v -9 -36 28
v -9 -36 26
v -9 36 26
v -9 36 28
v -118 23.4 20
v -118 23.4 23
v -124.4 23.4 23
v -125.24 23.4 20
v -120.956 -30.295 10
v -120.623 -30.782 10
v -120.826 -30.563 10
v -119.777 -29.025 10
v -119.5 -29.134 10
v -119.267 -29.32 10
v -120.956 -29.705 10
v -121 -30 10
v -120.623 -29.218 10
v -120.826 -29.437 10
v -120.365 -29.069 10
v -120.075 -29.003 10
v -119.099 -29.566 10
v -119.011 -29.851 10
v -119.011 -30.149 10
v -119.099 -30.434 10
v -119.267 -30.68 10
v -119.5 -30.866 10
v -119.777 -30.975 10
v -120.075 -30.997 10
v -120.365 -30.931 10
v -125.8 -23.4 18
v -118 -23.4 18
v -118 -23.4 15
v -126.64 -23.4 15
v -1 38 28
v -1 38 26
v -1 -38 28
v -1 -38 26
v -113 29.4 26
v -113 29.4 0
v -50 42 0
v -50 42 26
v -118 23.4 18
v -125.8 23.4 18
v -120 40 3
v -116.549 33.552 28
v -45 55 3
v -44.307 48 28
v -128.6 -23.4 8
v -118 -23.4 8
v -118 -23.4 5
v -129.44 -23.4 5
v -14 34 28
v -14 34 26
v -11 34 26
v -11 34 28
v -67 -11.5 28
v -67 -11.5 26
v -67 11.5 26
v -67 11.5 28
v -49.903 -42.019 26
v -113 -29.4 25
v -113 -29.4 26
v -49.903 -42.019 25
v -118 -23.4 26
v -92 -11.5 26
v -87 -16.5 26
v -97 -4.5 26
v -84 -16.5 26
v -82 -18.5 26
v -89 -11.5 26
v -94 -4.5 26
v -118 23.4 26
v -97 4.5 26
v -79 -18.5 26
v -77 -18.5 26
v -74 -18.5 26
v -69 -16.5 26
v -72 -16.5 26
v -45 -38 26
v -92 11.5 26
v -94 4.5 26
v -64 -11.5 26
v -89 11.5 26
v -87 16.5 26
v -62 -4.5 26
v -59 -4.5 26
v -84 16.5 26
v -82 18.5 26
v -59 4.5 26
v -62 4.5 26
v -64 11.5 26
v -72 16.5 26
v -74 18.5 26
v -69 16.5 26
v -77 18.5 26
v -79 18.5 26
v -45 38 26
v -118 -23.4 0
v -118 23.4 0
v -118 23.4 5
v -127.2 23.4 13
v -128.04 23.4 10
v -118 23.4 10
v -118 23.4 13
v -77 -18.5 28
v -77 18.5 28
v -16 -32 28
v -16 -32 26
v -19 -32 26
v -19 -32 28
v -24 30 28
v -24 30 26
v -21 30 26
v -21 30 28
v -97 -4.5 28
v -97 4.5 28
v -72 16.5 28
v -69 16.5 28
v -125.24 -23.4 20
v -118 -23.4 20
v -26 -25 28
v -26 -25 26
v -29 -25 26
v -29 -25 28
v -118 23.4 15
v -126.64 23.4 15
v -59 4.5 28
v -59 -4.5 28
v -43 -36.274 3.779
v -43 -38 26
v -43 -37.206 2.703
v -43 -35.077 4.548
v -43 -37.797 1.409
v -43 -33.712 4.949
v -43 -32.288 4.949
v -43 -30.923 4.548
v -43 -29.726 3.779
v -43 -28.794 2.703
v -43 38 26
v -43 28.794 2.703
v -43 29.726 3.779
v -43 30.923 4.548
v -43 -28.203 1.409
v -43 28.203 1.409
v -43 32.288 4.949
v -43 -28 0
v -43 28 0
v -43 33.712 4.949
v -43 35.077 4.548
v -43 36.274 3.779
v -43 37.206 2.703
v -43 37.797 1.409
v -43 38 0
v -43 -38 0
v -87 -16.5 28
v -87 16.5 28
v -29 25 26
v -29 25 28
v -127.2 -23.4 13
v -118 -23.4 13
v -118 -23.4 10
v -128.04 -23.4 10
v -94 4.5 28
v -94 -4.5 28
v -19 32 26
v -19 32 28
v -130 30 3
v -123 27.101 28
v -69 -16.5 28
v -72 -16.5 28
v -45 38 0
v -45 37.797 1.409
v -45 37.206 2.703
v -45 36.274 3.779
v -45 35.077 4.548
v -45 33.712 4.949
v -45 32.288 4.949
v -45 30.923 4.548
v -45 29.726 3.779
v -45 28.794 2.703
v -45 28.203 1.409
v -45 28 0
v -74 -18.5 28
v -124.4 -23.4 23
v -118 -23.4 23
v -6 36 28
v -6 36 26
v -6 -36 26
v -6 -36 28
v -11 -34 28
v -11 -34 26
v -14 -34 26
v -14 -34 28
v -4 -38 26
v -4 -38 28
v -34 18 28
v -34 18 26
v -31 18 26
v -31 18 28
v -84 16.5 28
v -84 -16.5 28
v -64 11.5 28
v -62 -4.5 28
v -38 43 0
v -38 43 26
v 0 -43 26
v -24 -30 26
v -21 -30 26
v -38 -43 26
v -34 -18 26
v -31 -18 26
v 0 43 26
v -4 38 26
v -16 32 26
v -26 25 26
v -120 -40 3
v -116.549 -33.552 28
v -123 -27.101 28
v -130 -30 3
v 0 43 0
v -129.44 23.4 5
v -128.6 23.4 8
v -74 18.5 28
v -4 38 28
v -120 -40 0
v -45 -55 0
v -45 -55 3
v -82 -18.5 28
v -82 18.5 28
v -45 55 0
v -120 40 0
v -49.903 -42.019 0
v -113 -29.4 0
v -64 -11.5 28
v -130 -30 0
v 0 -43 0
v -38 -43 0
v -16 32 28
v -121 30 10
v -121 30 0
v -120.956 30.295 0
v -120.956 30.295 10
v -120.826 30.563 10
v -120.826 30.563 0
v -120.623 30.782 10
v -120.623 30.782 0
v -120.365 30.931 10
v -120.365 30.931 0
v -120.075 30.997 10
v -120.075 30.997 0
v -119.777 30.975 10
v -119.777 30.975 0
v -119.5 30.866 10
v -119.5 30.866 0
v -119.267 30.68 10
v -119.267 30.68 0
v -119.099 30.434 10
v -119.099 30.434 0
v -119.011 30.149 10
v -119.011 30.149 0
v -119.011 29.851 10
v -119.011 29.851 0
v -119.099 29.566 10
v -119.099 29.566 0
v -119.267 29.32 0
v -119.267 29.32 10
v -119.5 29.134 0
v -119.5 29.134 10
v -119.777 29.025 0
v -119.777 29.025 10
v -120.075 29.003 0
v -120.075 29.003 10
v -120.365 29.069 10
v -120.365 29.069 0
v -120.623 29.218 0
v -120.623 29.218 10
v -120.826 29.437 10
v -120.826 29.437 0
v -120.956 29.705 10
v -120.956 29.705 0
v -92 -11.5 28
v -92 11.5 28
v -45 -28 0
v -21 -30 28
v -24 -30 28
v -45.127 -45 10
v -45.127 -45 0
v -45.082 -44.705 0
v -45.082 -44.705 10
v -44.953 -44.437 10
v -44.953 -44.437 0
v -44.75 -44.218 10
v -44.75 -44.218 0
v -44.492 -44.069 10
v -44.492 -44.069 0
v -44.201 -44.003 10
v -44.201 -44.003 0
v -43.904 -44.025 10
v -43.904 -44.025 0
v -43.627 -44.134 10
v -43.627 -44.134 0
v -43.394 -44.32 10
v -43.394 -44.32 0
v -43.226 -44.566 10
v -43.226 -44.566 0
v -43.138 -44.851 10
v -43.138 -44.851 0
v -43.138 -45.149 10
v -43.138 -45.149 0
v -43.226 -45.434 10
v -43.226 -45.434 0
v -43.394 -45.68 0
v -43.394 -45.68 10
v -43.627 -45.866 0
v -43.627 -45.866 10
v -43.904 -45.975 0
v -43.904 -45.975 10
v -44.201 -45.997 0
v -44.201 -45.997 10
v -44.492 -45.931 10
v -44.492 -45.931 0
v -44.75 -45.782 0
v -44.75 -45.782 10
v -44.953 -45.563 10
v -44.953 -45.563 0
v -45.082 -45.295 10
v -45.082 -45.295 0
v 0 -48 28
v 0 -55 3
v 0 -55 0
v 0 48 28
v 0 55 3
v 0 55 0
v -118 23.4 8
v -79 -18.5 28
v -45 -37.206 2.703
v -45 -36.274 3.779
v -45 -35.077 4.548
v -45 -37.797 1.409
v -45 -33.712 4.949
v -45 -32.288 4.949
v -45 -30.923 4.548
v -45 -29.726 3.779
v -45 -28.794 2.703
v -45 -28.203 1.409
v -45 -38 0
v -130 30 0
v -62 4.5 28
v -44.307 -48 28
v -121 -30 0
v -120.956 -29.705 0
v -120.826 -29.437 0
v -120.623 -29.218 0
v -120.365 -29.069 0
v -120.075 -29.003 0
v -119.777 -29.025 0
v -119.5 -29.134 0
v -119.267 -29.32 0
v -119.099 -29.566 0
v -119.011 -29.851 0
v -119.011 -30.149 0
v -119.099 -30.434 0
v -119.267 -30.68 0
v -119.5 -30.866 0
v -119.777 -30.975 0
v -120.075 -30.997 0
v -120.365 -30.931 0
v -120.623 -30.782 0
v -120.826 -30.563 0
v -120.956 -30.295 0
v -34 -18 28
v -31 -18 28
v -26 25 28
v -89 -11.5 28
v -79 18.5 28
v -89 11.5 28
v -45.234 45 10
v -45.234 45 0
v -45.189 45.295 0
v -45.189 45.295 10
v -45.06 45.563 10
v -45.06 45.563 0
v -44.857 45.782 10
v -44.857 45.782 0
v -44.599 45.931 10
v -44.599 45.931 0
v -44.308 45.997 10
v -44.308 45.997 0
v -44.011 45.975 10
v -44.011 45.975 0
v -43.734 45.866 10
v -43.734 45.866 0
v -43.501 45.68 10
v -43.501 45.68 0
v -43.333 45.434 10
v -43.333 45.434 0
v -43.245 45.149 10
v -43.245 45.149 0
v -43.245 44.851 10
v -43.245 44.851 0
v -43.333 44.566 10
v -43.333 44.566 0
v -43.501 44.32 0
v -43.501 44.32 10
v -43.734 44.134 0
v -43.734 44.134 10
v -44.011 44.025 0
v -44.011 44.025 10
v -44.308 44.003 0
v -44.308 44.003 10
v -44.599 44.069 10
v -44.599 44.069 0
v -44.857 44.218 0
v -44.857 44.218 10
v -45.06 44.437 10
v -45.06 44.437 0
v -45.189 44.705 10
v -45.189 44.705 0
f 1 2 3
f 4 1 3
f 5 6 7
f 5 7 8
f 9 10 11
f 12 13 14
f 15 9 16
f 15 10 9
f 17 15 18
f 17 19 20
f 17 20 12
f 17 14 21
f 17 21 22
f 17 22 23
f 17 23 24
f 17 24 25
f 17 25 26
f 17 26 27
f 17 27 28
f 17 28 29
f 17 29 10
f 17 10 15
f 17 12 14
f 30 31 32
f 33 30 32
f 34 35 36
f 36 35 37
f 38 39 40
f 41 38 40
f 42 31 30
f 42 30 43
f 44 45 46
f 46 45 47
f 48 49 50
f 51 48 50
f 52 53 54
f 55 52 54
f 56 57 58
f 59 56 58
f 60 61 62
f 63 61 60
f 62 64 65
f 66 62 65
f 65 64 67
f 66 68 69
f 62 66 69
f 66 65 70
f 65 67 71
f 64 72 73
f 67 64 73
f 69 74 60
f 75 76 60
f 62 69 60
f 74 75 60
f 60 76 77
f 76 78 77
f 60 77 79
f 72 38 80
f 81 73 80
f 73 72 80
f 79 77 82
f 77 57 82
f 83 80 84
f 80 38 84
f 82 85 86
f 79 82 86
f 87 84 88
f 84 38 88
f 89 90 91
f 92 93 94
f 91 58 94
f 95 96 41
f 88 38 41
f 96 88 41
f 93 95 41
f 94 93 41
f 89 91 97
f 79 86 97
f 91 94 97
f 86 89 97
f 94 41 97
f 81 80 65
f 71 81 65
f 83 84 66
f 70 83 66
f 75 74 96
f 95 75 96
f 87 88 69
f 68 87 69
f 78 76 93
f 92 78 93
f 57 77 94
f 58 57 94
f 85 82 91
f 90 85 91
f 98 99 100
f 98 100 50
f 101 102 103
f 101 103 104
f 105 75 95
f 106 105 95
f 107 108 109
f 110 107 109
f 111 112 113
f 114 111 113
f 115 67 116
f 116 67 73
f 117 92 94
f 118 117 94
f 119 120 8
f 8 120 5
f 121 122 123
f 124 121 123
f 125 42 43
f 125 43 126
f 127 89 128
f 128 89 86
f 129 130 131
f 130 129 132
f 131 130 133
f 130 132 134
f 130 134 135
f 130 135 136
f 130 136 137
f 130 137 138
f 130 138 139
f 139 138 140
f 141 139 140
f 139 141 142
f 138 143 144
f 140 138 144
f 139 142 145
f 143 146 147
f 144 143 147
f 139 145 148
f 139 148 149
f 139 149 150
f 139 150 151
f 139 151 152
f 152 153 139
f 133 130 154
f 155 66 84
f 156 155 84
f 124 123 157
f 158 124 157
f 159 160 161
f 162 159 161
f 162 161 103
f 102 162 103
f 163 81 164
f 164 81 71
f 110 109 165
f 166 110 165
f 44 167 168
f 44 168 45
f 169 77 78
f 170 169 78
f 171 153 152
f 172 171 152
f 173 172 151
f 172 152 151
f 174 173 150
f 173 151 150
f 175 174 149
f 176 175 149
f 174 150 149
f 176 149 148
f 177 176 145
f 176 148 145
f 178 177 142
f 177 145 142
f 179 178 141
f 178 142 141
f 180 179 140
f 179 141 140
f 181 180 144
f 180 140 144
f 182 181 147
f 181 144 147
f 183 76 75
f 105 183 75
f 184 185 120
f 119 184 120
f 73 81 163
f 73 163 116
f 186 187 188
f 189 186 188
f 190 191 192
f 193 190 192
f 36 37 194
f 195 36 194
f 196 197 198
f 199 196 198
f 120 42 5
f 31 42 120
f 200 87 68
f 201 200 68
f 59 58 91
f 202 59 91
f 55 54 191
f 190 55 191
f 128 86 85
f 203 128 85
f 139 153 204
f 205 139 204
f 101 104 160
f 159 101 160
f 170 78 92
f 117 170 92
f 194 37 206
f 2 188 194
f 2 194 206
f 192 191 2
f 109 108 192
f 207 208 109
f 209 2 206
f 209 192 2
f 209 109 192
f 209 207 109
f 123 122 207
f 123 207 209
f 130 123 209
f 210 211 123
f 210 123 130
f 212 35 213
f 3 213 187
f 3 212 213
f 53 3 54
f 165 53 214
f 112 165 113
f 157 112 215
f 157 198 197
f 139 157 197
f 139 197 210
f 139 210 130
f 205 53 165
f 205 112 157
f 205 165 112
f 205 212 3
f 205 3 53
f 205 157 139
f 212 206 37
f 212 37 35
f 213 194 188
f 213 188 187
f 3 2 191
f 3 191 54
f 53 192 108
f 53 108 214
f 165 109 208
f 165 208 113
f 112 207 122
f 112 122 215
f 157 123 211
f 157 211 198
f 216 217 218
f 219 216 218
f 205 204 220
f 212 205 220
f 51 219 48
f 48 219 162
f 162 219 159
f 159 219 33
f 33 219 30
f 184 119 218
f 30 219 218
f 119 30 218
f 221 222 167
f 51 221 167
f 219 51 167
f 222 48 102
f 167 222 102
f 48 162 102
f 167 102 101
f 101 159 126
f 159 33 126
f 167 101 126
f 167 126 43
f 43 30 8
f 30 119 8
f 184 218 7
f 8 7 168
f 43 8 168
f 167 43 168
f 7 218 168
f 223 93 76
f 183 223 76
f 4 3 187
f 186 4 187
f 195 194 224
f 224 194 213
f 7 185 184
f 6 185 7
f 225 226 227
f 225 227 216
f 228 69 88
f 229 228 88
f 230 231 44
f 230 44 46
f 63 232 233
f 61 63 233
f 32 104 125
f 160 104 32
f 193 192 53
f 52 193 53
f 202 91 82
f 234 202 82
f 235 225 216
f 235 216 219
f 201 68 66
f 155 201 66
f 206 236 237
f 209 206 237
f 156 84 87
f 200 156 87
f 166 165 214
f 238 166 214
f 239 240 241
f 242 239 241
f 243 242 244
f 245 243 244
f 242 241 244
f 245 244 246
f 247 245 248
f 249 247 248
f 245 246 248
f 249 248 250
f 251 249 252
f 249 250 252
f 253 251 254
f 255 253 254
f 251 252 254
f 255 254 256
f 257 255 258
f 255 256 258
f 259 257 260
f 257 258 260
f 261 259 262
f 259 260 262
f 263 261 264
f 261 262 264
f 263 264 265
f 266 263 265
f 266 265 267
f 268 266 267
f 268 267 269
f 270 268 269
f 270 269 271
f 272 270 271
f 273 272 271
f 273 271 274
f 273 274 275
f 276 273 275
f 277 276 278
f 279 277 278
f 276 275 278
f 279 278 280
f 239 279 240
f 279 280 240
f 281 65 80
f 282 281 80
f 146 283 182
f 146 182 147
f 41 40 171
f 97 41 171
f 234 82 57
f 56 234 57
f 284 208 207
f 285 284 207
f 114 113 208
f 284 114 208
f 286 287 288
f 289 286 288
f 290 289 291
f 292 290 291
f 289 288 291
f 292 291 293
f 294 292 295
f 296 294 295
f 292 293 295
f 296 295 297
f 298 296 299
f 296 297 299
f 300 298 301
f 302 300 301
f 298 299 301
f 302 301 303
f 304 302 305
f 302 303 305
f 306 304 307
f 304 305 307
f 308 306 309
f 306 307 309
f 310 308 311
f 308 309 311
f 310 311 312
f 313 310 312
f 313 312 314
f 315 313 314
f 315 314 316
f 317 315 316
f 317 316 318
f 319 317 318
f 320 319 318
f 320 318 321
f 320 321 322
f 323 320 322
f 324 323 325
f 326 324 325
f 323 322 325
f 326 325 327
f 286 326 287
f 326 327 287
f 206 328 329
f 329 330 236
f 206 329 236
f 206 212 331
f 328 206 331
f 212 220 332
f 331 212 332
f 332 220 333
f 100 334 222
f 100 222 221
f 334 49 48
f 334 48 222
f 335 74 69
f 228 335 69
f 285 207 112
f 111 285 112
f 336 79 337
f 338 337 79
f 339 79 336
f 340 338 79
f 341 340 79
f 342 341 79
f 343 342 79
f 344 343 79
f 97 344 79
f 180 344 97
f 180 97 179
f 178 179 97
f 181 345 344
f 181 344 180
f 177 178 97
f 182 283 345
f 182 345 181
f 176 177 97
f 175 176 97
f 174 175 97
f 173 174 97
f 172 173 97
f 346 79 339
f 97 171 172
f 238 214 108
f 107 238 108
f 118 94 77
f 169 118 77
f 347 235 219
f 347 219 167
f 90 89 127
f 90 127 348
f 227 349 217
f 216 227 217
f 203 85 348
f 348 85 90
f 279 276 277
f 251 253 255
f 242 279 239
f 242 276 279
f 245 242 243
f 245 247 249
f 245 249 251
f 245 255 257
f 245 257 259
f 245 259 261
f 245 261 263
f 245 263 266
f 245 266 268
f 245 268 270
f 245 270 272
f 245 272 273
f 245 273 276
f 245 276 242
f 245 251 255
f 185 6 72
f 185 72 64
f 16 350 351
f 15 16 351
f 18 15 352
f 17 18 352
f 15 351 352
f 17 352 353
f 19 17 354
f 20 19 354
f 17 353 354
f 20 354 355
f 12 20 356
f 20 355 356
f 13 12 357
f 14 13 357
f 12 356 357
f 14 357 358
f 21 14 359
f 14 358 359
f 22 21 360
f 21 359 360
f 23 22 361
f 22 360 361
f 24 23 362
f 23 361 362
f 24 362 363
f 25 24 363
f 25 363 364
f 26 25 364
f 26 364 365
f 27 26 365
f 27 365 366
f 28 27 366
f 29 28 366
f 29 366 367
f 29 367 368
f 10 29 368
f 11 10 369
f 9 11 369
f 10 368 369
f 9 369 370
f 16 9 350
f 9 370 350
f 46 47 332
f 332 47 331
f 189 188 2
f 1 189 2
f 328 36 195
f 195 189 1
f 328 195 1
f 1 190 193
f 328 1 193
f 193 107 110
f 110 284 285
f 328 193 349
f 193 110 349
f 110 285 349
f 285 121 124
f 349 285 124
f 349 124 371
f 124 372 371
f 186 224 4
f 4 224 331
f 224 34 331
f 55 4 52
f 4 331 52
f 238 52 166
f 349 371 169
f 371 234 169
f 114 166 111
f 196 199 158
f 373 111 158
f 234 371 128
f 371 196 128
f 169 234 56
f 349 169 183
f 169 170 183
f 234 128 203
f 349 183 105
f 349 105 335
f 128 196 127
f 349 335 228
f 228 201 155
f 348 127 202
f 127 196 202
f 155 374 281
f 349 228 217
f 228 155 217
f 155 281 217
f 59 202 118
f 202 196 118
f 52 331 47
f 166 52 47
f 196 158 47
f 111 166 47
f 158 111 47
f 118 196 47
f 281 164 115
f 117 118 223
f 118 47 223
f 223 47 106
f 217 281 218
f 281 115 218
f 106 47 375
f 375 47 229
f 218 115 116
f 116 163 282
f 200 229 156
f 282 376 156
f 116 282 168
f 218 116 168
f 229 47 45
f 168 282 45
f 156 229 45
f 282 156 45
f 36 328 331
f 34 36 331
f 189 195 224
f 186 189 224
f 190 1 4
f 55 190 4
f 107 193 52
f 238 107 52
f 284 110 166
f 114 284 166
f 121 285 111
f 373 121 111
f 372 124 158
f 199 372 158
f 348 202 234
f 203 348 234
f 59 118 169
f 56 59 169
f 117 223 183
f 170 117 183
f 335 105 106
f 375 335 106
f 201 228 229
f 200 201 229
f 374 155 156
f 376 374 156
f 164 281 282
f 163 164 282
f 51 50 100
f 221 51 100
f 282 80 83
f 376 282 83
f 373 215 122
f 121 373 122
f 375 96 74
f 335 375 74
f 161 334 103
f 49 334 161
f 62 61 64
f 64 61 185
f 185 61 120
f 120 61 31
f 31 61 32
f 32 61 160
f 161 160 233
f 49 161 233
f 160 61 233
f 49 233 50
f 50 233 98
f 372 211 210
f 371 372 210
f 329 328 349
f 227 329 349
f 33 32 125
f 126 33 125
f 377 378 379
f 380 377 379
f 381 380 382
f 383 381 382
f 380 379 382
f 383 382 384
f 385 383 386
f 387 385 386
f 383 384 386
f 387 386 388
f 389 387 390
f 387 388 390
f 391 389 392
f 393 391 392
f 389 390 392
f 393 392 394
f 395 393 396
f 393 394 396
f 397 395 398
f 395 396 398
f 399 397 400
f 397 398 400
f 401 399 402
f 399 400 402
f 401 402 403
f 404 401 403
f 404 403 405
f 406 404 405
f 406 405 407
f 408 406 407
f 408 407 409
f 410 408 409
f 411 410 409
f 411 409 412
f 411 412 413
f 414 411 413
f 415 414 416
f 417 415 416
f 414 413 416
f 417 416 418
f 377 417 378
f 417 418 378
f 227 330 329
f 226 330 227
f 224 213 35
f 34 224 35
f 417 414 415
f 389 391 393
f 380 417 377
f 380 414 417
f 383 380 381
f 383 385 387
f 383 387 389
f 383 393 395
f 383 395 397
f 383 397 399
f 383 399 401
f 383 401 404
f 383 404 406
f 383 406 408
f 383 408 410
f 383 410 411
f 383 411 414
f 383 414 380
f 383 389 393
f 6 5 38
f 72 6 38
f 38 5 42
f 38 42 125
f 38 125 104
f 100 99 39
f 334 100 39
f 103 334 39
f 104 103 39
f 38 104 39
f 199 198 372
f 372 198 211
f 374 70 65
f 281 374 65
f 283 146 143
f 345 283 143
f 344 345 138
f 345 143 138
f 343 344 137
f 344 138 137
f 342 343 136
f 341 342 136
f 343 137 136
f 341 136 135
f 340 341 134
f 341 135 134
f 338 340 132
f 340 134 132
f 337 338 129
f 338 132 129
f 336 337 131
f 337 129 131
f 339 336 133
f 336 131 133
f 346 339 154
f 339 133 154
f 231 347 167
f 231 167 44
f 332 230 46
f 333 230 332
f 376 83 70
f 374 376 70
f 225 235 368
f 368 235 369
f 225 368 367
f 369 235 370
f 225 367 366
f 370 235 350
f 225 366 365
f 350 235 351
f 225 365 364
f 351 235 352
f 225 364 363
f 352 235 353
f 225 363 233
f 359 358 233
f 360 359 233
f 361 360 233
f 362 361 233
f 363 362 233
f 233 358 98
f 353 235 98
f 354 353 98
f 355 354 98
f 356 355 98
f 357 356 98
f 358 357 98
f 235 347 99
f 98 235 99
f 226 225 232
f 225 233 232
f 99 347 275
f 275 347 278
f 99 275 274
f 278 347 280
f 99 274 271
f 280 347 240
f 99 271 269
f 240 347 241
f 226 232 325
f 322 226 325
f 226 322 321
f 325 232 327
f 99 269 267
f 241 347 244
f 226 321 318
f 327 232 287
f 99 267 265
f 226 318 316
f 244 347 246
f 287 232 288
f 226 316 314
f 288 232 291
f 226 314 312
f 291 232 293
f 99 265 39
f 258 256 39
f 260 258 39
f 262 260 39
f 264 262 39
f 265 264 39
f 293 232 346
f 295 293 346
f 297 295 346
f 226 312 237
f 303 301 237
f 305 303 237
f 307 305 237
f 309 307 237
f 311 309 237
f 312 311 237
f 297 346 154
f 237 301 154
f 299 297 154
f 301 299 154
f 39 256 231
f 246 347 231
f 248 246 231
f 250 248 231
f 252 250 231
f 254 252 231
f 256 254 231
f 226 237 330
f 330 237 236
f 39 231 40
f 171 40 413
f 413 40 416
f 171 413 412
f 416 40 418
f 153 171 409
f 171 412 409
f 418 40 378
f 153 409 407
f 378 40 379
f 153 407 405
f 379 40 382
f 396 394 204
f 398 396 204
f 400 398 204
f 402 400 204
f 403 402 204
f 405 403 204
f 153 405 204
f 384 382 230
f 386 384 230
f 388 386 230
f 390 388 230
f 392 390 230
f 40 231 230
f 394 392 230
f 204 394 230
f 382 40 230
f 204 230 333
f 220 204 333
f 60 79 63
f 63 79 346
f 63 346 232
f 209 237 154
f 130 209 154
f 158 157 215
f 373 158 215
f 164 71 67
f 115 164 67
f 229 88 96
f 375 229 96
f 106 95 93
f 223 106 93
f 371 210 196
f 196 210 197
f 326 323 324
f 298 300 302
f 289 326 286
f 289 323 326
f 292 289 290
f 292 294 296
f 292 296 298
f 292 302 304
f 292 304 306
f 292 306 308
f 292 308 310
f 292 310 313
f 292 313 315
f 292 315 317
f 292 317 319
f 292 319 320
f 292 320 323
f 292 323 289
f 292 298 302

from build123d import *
from OCP.BRepFilletAPI import BRepFilletAPI_MakeChamfer

# Parameters (mm, degrees)
ESBO_O1_W                 = 2
ESBO_O1_H                 = 86
RESSALTO_EXTRUS_O3_DEPTH  = 25
RESSALTO_EXTRUS_O16_DEPTH = 25
RESSALTO_EXTRUS_O17_DEPTH = 28
CHANFRO6_SIZE             = 25
CHANFRO6_SIZE2            = 7
RESSALTO_EXTRUS_O19_DEPTH = 25
ESBO_O9_R                 = 1
CORTE_EXTRUS_O1_DEPTH     = 10
ESBO_O13_W                = 5
ESBO_O13_H                = 10
ESBO_O13_W_2              = 3
ESBO_O13_H_2              = 46.8
CORTE_EXTRUS_O6_DEPTH     = 256.564081983
CORTE_EXTRUS_O8_REACH     = 185.679
CORTE_EXTRUS_O9_REACH     = 185.679
CORTE_EXTRUS_O10_REACH    = 257.564
ESBO_O14_W                = 3
ESBO_O14_H                = 46.8
RESSALTO_EXTRUS_O20_DEPTH = 3
CORTE_EXTRUS_O13_DEPTH    = 3
ESBO_O23_W                = 3
ESBO_O23_H                = 4.5
CORTE_EXTRUS_O14_DEPTH    = 3
CORTE_EXTRUS_O15_REACH    = 145.906
ESBO_O24_W                = 130
ESBO_O24_H                = 110
CORTE_EXTRUS_O16_DEPTH    = 1
CORTE_EXTRUS_O17_DEPTH    = 1


with BuildPart() as part:
    # Esboço1 → Ressalto-extrusão3 (new body)
    with BuildSketch(Plane.XY):
        Polygon((-45, -43), (-120, -28), (-120, -30), (-45, -45), (45, -45), (45, -43), (43, -43), (-43, -43), align=None)
        with Locations((44, 0)):
            Rectangle(ESBO_O1_W, ESBO_O1_H)
        Polygon((45, 45), (-45, 45), (-45, 43), (-43, 43), (43, 43), (45, 43), align=None)
        with Locations((-44, 0)):
            Rectangle(ESBO_O1_W, ESBO_O1_H)
        Polygon((-120, 30), (-120, 28), (-45, 43), (-45, 45), align=None)
        Polygon((-45, -43), (-120, -28), (-120, -30), (-45, -45), (45, -45), (45, -43), (43, -43), (-43, -43), align=None)
        Polygon((120, -28), (45, -43), (45, -45), (120, -30), align=None)
        Polygon((120, 30), (45, 45), (45, 43), (120, 28), align=None)
    extrude(amount=RESSALTO_EXTRUS_O3_DEPTH)

    # Esboço6 → Ressalto-extrusão16 (add)
    with BuildSketch(Plane.XY):
        Polygon((-120, -28), (-120, 28), (-118, 28.4), (-118, -28.4), align=None)
        Polygon((120, 28), (120, -28), (118, -28.4), (118, 28.4), align=None)
    extrude(amount=RESSALTO_EXTRUS_O16_DEPTH)

    # Esboço7 → Ressalto-extrusão17 (add)
    with BuildSketch(Plane.XY):
        Polygon((-120, 40), (-45, 55), (45, 55), (120, 40), (130, 30), (130, -30), (120, -40), (45, -55), (-45, -55), (-120, -40), (-130, -30), (-130, 30), align=None)
        Polygon((-45, -45), (45, -45), (120, -30), (120, 30), (45, 45), (-45, 45), (-120, 30), (-120, -30), align=None, mode=Mode.SUBTRACT)
    extrude(amount=RESSALTO_EXTRUS_O17_DEPTH)

    # Chanfro6: one chamfer whose edges measure the first distance from different faces: ONE call of the kernel's chamfer builder (chamfer() names one face for all edges)
    chanfro6_edges_1 = [part.edges().sort_by_distance(p)[0] for p in [
        (82.5, -47.5, 28),
    ]]
    chanfro6_side_1 = [part.faces().sort_by_distance(p)[0] for p in [
        (82.5, -47.5, 14),
    ]]
    chanfro6_edges_2 = [part.edges().sort_by_distance(p)[0] for p in [
        (125, -35, 28),
    ]]
    chanfro6_side_2 = [part.faces().sort_by_distance(p)[0] for p in [
        (125, -35, 14),
    ]]
    chanfro6_edges_3 = [part.edges().sort_by_distance(p)[0] for p in [
        (130, 0, 28),
    ]]
    chanfro6_side_3 = [part.faces().sort_by_distance(p)[0] for p in [
        (130, 0, 14),
    ]]
    chanfro6_edges_4 = [part.edges().sort_by_distance(p)[0] for p in [
        (125, 35, 28),
    ]]
    chanfro6_side_4 = [part.faces().sort_by_distance(p)[0] for p in [
        (125, 35, 14),
    ]]
    chanfro6_edges_5 = [part.edges().sort_by_distance(p)[0] for p in [
        (82.5, 47.5, 28),
    ]]
    chanfro6_side_5 = [part.faces().sort_by_distance(p)[0] for p in [
        (82.5, 47.5, 14),
    ]]
    chanfro6_edges_6 = [part.edges().sort_by_distance(p)[0] for p in [
        (0, 55, 28),
    ]]
    chanfro6_side_6 = [part.faces().sort_by_distance(p)[0] for p in [
        (0, 55, 14),
    ]]
    chanfro6_edges_7 = [part.edges().sort_by_distance(p)[0] for p in [
        (-82.5, 47.5, 28),
    ]]
    chanfro6_side_7 = [part.faces().sort_by_distance(p)[0] for p in [
        (-82.5, 47.5, 14),
    ]]
    chanfro6_edges_8 = [part.edges().sort_by_distance(p)[0] for p in [
        (-125, 35, 28),
    ]]
    chanfro6_side_8 = [part.faces().sort_by_distance(p)[0] for p in [
        (-125, 35, 14),
    ]]
    chanfro6_edges_9 = [part.edges().sort_by_distance(p)[0] for p in [
        (-130, 0, 28),
    ]]
    chanfro6_side_9 = [part.faces().sort_by_distance(p)[0] for p in [
        (-130, 0, 14),
    ]]
    chanfro6_edges_10 = [part.edges().sort_by_distance(p)[0] for p in [
        (-125, -35, 28),
    ]]
    chanfro6_side_10 = [part.faces().sort_by_distance(p)[0] for p in [
        (-125, -35, 14),
    ]]
    chanfro6_edges_11 = [part.edges().sort_by_distance(p)[0] for p in [
        (-82.5, -47.5, 28),
    ]]
    chanfro6_side_11 = [part.faces().sort_by_distance(p)[0] for p in [
        (-82.5, -47.5, 14),
    ]]
    chanfro6_edges_12 = [part.edges().sort_by_distance(p)[0] for p in [
        (0, -55, 28),
    ]]
    chanfro6_side_12 = [part.faces().sort_by_distance(p)[0] for p in [
        (0, -55, 14),
    ]]
    chanfro6 = BRepFilletAPI_MakeChamfer(part.part.solid().wrapped)
    for e in chanfro6_edges_1:
        chanfro6.Add(CHANFRO6_SIZE, CHANFRO6_SIZE2, e.wrapped, chanfro6_side_1[0].wrapped)  # the first distance lies on this face
    for e in chanfro6_edges_2:
        chanfro6.Add(CHANFRO6_SIZE, CHANFRO6_SIZE2, e.wrapped, chanfro6_side_2[0].wrapped)  # the first distance lies on this face
    for e in chanfro6_edges_3:
        chanfro6.Add(CHANFRO6_SIZE, CHANFRO6_SIZE2, e.wrapped, chanfro6_side_3[0].wrapped)  # the first distance lies on this face
    for e in chanfro6_edges_4:
        chanfro6.Add(CHANFRO6_SIZE, CHANFRO6_SIZE2, e.wrapped, chanfro6_side_4[0].wrapped)  # the first distance lies on this face
    for e in chanfro6_edges_5:
        chanfro6.Add(CHANFRO6_SIZE, CHANFRO6_SIZE2, e.wrapped, chanfro6_side_5[0].wrapped)  # the first distance lies on this face
    for e in chanfro6_edges_6:
        chanfro6.Add(CHANFRO6_SIZE, CHANFRO6_SIZE2, e.wrapped, chanfro6_side_6[0].wrapped)  # the first distance lies on this face
    for e in chanfro6_edges_7:
        chanfro6.Add(CHANFRO6_SIZE, CHANFRO6_SIZE2, e.wrapped, chanfro6_side_7[0].wrapped)  # the first distance lies on this face
    for e in chanfro6_edges_8:
        chanfro6.Add(CHANFRO6_SIZE, CHANFRO6_SIZE2, e.wrapped, chanfro6_side_8[0].wrapped)  # the first distance lies on this face
    for e in chanfro6_edges_9:
        chanfro6.Add(CHANFRO6_SIZE, CHANFRO6_SIZE2, e.wrapped, chanfro6_side_9[0].wrapped)  # the first distance lies on this face
    for e in chanfro6_edges_10:
        chanfro6.Add(CHANFRO6_SIZE, CHANFRO6_SIZE2, e.wrapped, chanfro6_side_10[0].wrapped)  # the first distance lies on this face
    for e in chanfro6_edges_11:
        chanfro6.Add(CHANFRO6_SIZE, CHANFRO6_SIZE2, e.wrapped, chanfro6_side_11[0].wrapped)  # the first distance lies on this face
    for e in chanfro6_edges_12:
        chanfro6.Add(CHANFRO6_SIZE, CHANFRO6_SIZE2, e.wrapped, chanfro6_side_12[0].wrapped)  # the first distance lies on this face
    add(Compound.cast(chanfro6.Shape()), mode=Mode.REPLACE)

    # Esboço8 → Ressalto-extrusão19 (add)
    with BuildSketch(Plane.XY):
        Polygon((-118, 28.4), (-118, 23.4), (-113, 29.4), align=None)
        Polygon((-45, 38), (-45, 43), (-50, 42), align=None)
        Polygon((-49.902903378, -42.019419324), (-45, -43), (-45, -38), align=None)
        Polygon((-118, -23.4), (-118, -28.4), (-113, -29.4), align=None)
        Polygon((118, 23.4), (118, 28.4), (113, 29.4), align=None)
        Polygon((113, -29.4), (118, -28.4), (118, -23.4), align=None)
        Polygon((45, -38), (45, -43), (50, -42), align=None)
        Polygon((50, 42), (45, 43), (45, 38), align=None)
        Polygon((-43, -38), (-43, -43), (-38, -43), align=None)
        Polygon((-38, 43), (-43, 43), (-43, 38), align=None)
        Polygon((43, 38), (43, 43), (38, 43), align=None)
        Polygon((38, -43), (43, -43), (43, -38), align=None)
    extrude(amount=RESSALTO_EXTRUS_O19_DEPTH)

    # Esboço9 → Corte-extrusão1 (cut)
    with BuildSketch(Plane(origin=(0, 0, 0), x_dir=(-1, 0, 0), z_dir=(0, 0, -1))):
        with Locations((44.126560345, -45)):
            Circle(ESBO_O9_R)
        with Locations((-44.233718703, -45)):
            Circle(ESBO_O9_R)
        with Locations((-44.233718703, 45)):
            Circle(ESBO_O9_R)
        with Locations((44.233718703, 45)):
            Circle(ESBO_O9_R)
        with Locations((120, -30)):
            Circle(ESBO_O9_R)
        with Locations((120, 30)):
            Circle(ESBO_O9_R)
        with Locations((-120, 30)):
            Circle(ESBO_O9_R)
        with Locations((-120, -30)):
            Circle(ESBO_O9_R)
    extrude(amount=-CORTE_EXTRUS_O1_DEPTH, mode=Mode.SUBTRACT)

    # Esboço13 → Corte-extrusão6 (cut, through all)
    with BuildSketch(Plane.ZY.offset(-118)):
        with Locations((2.5, 0)):
            Rectangle(ESBO_O13_W, ESBO_O13_H)
        with Locations((21.5, 0)):
            Rectangle(ESBO_O13_W_2, ESBO_O13_H_2)
        with Locations((16.5, 0)):
            Rectangle(ESBO_O13_W_2, ESBO_O13_H_2)
        with Locations((11.5, 0)):
            Rectangle(ESBO_O13_W_2, ESBO_O13_H_2)
    extrude(amount=-CORTE_EXTRUS_O6_DEPTH, mode=Mode.SUBTRACT)

    # Esboço15 → Corte-extrusão8 (cut, up to next)
    with BuildSketch(Plane.ZY.offset(-43), mode=Mode.PRIVATE) as corte_extrus_o8_sk1:
        with BuildLine():
            ThreePointArc((0, -38), (2.5, -35.5), (0, -33))
            Line((0, -33), (0, -38))
        make_face()
    corte_extrus_o8_tool1 = extrude(corte_extrus_o8_sk1.sketch, amount=-CORTE_EXTRUS_O8_REACH, mode=Mode.PRIVATE) & part.part
    # Esboço15 → Corte-extrusão8 (cut, up to next)
    with BuildSketch(Plane.ZY.offset(-43), mode=Mode.PRIVATE) as corte_extrus_o8_sk2:
        with BuildLine():
            ThreePointArc((0, 33), (2.5, 35.5), (0, 38))
            Line((0, 38), (0, 33))
        make_face()
    corte_extrus_o8_tool2 = extrude(corte_extrus_o8_sk2.sketch, amount=-CORTE_EXTRUS_O8_REACH, mode=Mode.PRIVATE) & part.part
    add(corte_extrus_o8_tool1.solids().sort_by_distance((43, -35.5, 1.061033))[0], mode=Mode.SUBTRACT)
    add(corte_extrus_o8_tool2.solids().sort_by_distance((43, 35.5, 1.061033))[0], mode=Mode.SUBTRACT)

    # Esboço16 → Corte-extrusão9 (cut, up to next)
    with BuildSketch(Plane(origin=(-43, 0, 0), x_dir=(0, 0, -1), z_dir=(1, 0, 0)), mode=Mode.PRIVATE) as corte_extrus_o9_sk1:
        with BuildLine():
            ThreePointArc((0, -28), (-5, -33), (0, -38))
            Line((0, -38), (0, -28))
        make_face()
    corte_extrus_o9_tool1 = extrude(corte_extrus_o9_sk1.sketch, amount=-CORTE_EXTRUS_O9_REACH, mode=Mode.PRIVATE) & part.part
    # Esboço16 → Corte-extrusão9 (cut, up to next)
    with BuildSketch(Plane(origin=(-43, 0, 0), x_dir=(0, 0, -1), z_dir=(1, 0, 0)), mode=Mode.PRIVATE) as corte_extrus_o9_sk2:
        with BuildLine():
            ThreePointArc((0, 38), (-5, 33), (0, 28))
            Line((0, 28), (0, 38))
        make_face()
    corte_extrus_o9_tool2 = extrude(corte_extrus_o9_sk2.sketch, amount=-CORTE_EXTRUS_O9_REACH, mode=Mode.PRIVATE) & part.part
    add(corte_extrus_o9_tool1.solids().sort_by_distance((-43, -33, 2.122066))[0], mode=Mode.SUBTRACT)
    add(corte_extrus_o9_tool2.solids().sort_by_distance((-43, 33, 2.122066))[0], mode=Mode.SUBTRACT)

    # Corte-extrusão10: up to this plane
    corte_extrus_o10_end = Plane(origin=(-123, -38, 28), z_dir=(-0.9629640197141827, 0, 0.2696299255199678))
    # Esboço14 → Corte-extrusão10 (cut, up to the surface)
    with BuildSketch(Plane(origin=(-118, 0, 0), x_dir=(0, 0, -1), z_dir=(1, 0, 0)), mode=Mode.PRIVATE) as corte_extrus_o10_sk1:
        with Locations((-21.5, 0)):
            Rectangle(ESBO_O14_W, ESBO_O14_H)
    corte_extrus_o10_tool1 = split(extrude(corte_extrus_o10_sk1.sketch, amount=-CORTE_EXTRUS_O10_REACH, mode=Mode.PRIVATE), bisect_by=corte_extrus_o10_end, keep=Keep.BOTH, mode=Mode.PRIVATE)
    add(corte_extrus_o10_tool1.solids().sort_by_distance((-118, 0, 21.5))[0], mode=Mode.SUBTRACT)
    # Esboço14 → Corte-extrusão10 (cut, up to the surface)
    with BuildSketch(Plane(origin=(-118, 0, 0), x_dir=(0, 0, -1), z_dir=(1, 0, 0)), mode=Mode.PRIVATE) as corte_extrus_o10_sk2:
        with Locations((-16.5, 0)):
            Rectangle(ESBO_O14_W, ESBO_O14_H)
    corte_extrus_o10_tool2 = split(extrude(corte_extrus_o10_sk2.sketch, amount=-CORTE_EXTRUS_O10_REACH, mode=Mode.PRIVATE), bisect_by=corte_extrus_o10_end, keep=Keep.BOTH, mode=Mode.PRIVATE)
    add(corte_extrus_o10_tool2.solids().sort_by_distance((-118, 0, 16.5))[0], mode=Mode.SUBTRACT)
    # Esboço14 → Corte-extrusão10 (cut, up to the surface)
    with BuildSketch(Plane(origin=(-118, 0, 0), x_dir=(0, 0, -1), z_dir=(1, 0, 0)), mode=Mode.PRIVATE) as corte_extrus_o10_sk3:
        Polygon((-13, 23.4), (-13, -23.4), (-12.5, -23.4), (-10, -23.4), (-10, 23.4), (-12.5, 23.4), align=None)
    corte_extrus_o10_tool3 = split(extrude(corte_extrus_o10_sk3.sketch, amount=-CORTE_EXTRUS_O10_REACH, mode=Mode.PRIVATE), bisect_by=corte_extrus_o10_end, keep=Keep.BOTH, mode=Mode.PRIVATE)
    add(corte_extrus_o10_tool3.solids().sort_by_distance((-118, 0, 11.5))[0], mode=Mode.SUBTRACT)
    # Esboço14 → Corte-extrusão10 (cut, up to the surface)
    with BuildSketch(Plane(origin=(-118, 0, 0), x_dir=(0, 0, -1), z_dir=(1, 0, 0)), mode=Mode.PRIVATE) as corte_extrus_o10_sk4:
        with Locations((-6.5, 0)):
            Rectangle(ESBO_O14_W, ESBO_O14_H)
    corte_extrus_o10_tool4 = split(extrude(corte_extrus_o10_sk4.sketch, amount=-CORTE_EXTRUS_O10_REACH, mode=Mode.PRIVATE), bisect_by=corte_extrus_o10_end, keep=Keep.BOTH, mode=Mode.PRIVATE)
    add(corte_extrus_o10_tool4.solids().sort_by_distance((-118, 0, 6.5))[0], mode=Mode.SUBTRACT)

    # Esboço20 → Ressalto-extrusão20 (add)
    with BuildSketch(Plane.XY.offset(28)):
        Polygon((-120, 30), (-45, 45), (45, 45), (120, 30), (120, -30), (45, -45), (-45, -45), (-120, -30), align=None)
    extrude(amount=-RESSALTO_EXTRUS_O20_DEPTH)

    # Esboço22 → Corte-extrusão13 (cut)
    with BuildSketch(Plane(origin=(0, 0, 25), x_dir=(-1, 0, 0), z_dir=(0, 0, -1))):
        Polygon((-33.799138949, -18), (-30.799138949, -18), (-30.799138949, 18), (-33.799138949, 18), (-33.799138949, 14), (-33.799138949, -14), align=None)
        Polygon((-28.799138949, -25), (-25.799138949, -25), (-25.799138949, 25), (-28.799138949, 25), (-28.799138949, 22), (-28.799138949, -22), align=None)
        Polygon((-24, -30), (-21, -30), (-21, 30), (-24, 30), (-24, 28), (-24, -28), align=None)
        Polygon((-19, -32), (-16, -32), (-16, 32), (-19, 32), (-19, 31), (-19, -31), align=None)
        Polygon((-14, -34), (-11, -34), (-11, 34), (-14, 34), (-14, 33), (-14, -33), align=None)
        Polygon((-9, -36), (-6, -36), (-6, 36), (-9, 36), (-9, 35), (-9, -35), align=None)
        Polygon((-4, -38), (-1, -38), (-1, 38), (-4, 38), (-4, 37), (-4, -37), align=None)
        Polygon((1, 38), (1, -38), (4, -38), (4, -37), (4, 37), (4, 38), align=None)
        Polygon((6, 36), (6, -36), (9, -36), (9, -35), (9, 35), (9, 36), align=None)
        Polygon((11, 34), (11, -34), (14, -34), (14, -33), (14, 33), (14, 34), align=None)
        Polygon((16, 32), (16, -32), (19, -32), (19, -31), (19, 31), (19, 32), align=None)
        Polygon((21, 30), (21, -30), (24, -30), (24, -28), (24, 28), (24, 30), align=None)
        Polygon((26, 25), (26, -25), (29, -25), (29, -22), (29, 22.932654574), (29, 25), align=None)
        Polygon((31, 18), (31, -18), (34, -18), (34, -14), (34, 14), (34, 18), align=None)
    extrude(amount=-CORTE_EXTRUS_O13_DEPTH, mode=Mode.SUBTRACT)

    # Esboço23 → Corte-extrusão14 (cut)
    with BuildSketch(Plane(origin=(0, 0, 25), x_dir=(-1, 0, 0), z_dir=(0, 0, -1))):
        with Locations((-60.5, -2.25)):
            Rectangle(ESBO_O23_W, ESBO_O23_H)
        with Locations((-60.5, 2.25)):
            Rectangle(ESBO_O23_W, ESBO_O23_H)
        Polygon((-67, 0), (-64, 0), (-64, 8.5), (-64, 11.5), (-67, 11.5), align=None)
        Polygon((-64, -8.5), (-64, 0), (-67, 0), (-67, -11.5), (-64, -11.5), align=None)
        Polygon((-72, 0), (-69, 0), (-69, 14.5), (-69, 16.5), (-72, 16.5), align=None)
        Polygon((-69, -14.5), (-69, 0), (-72, 0), (-72, -16.5), (-69, -16.5), align=None)
        Polygon((-74, -17.5), (-74, 0), (-77, 0), (-77, -18.5), (-74, -18.5), align=None)
        Polygon((-77, 0), (-74, 0), (-74, 17.5), (-74, 18.5), (-77, 18.5), align=None)
        Polygon((-82, 17.5), (-82, 0), (-79, 0), (-79, 18.5), (-82, 18.5), align=None)
        Polygon((-79, 0), (-82, 0), (-82, -17.5), (-82, -18.5), (-79, -18.5), align=None)
        Polygon((-84, 0), (-87, 0), (-87, -14.5), (-87, -16.5), (-84, -16.5), align=None)
        Polygon((-87, 14.5), (-87, 0), (-84, 0), (-84, 16.5), (-87, 16.5), align=None)
        Polygon((-92, 8.5), (-92, 0), (-89, 0), (-89, 11.5), (-92, 11.5), align=None)
        Polygon((-89, 0), (-92, 0), (-92, -8.5), (-92, -11.5), (-89, -11.5), align=None)
        with Locations((-95.5, 2.25)):
            Rectangle(ESBO_O23_W, ESBO_O23_H)
        with Locations((-95.5, -2.25)):
            Rectangle(ESBO_O23_W, ESBO_O23_H)
        with Locations((60.5, 2.25)):
            Rectangle(ESBO_O23_W, ESBO_O23_H)
        with Locations((60.5, -2.25)):
            Rectangle(ESBO_O23_W, ESBO_O23_H)
        Polygon((64, 8.5), (64, 0), (67, 0), (67, 11.5), (64, 11.5), align=None)
        Polygon((67, 0), (64, 0), (64, -8.5), (64, -11.5), (67, -11.5), align=None)
        Polygon((69, 14.5), (69, 0), (72, 0), (72, 16.5), (69, 16.5), align=None)
        Polygon((72, 0), (69, 0), (69, -14.5), (69, -16.5), (72, -16.5), align=None)
        Polygon((77, 0), (74, 0), (74, -17.5), (74, -18.5), (77, -18.5), align=None)
        Polygon((74, 17.5), (74, 0), (77, 0), (77, 18.5), (74, 18.5), align=None)
        Polygon((79, 0), (82, 0), (82, 17.5), (82, 18.5), (79, 18.5), align=None)
        Polygon((82, -17.5), (82, 0), (79, 0), (79, -18.5), (82, -18.5), align=None)
        Polygon((84, 0), (87, 0), (87, 14.5), (87, 16.5), (84, 16.5), align=None)
        Polygon((87, -14.5), (87, 0), (84, 0), (84, -16.5), (87, -16.5), align=None)
        Polygon((92, -8.5), (92, 0), (89, 0), (89, -11.5), (92, -11.5), align=None)
        with Locations((95.5, -2.25)):
            Rectangle(ESBO_O23_W, ESBO_O23_H)
        with Locations((95.5, 2.25)):
            Rectangle(ESBO_O23_W, ESBO_O23_H)
        Polygon((89, 0), (92, 0), (92, 8.5), (92, 11.5), (89, 11.5), align=None)
    extrude(amount=-CORTE_EXTRUS_O14_DEPTH, mode=Mode.SUBTRACT)

    # Esboço24 → Corte-extrusão15 (cut, up to next)
    with BuildSketch(Plane(origin=(0, 0, 0), x_dir=(-1, 0, 0), z_dir=(0, 0, -1)), mode=Mode.PRIVATE) as corte_extrus_o15_sk1:
        with Locations((-65, 0)):
            Rectangle(ESBO_O24_W, ESBO_O24_H)
    corte_extrus_o15_tool1 = extrude(corte_extrus_o15_sk1.sketch, amount=-CORTE_EXTRUS_O15_REACH, mode=Mode.PRIVATE) & part.part
    add(corte_extrus_o15_tool1.solids().sort_by_distance((65, 0, 0))[0], mode=Mode.SUBTRACT)

    # Esboço25 → Corte-extrusão16 (cut)
    with BuildSketch(Plane(origin=(0, 0, 25), x_dir=(-1, 0, 0), z_dir=(0, 0, -1))):
        Polygon((0, -43), (38, -43), (43, -38), (43, 38), (38, 43), (0, 43), align=None)
    extrude(amount=-CORTE_EXTRUS_O16_DEPTH, mode=Mode.SUBTRACT)

    # Esboço26 → Corte-extrusão17 (cut)
    with BuildSketch(Plane(origin=(0, 0, 25), x_dir=(-1, 0, 0), z_dir=(0, 0, -1))):
        Polygon((45, 38), (50, 42), (113, 29.4), (118, 23.4), (118, -23.4), (113, -29.4), (49.902903378, -42.019419324), (45, -38), align=None)
    extrude(amount=-CORTE_EXTRUS_O17_DEPTH, mode=Mode.SUBTRACT)


solid = part.part
